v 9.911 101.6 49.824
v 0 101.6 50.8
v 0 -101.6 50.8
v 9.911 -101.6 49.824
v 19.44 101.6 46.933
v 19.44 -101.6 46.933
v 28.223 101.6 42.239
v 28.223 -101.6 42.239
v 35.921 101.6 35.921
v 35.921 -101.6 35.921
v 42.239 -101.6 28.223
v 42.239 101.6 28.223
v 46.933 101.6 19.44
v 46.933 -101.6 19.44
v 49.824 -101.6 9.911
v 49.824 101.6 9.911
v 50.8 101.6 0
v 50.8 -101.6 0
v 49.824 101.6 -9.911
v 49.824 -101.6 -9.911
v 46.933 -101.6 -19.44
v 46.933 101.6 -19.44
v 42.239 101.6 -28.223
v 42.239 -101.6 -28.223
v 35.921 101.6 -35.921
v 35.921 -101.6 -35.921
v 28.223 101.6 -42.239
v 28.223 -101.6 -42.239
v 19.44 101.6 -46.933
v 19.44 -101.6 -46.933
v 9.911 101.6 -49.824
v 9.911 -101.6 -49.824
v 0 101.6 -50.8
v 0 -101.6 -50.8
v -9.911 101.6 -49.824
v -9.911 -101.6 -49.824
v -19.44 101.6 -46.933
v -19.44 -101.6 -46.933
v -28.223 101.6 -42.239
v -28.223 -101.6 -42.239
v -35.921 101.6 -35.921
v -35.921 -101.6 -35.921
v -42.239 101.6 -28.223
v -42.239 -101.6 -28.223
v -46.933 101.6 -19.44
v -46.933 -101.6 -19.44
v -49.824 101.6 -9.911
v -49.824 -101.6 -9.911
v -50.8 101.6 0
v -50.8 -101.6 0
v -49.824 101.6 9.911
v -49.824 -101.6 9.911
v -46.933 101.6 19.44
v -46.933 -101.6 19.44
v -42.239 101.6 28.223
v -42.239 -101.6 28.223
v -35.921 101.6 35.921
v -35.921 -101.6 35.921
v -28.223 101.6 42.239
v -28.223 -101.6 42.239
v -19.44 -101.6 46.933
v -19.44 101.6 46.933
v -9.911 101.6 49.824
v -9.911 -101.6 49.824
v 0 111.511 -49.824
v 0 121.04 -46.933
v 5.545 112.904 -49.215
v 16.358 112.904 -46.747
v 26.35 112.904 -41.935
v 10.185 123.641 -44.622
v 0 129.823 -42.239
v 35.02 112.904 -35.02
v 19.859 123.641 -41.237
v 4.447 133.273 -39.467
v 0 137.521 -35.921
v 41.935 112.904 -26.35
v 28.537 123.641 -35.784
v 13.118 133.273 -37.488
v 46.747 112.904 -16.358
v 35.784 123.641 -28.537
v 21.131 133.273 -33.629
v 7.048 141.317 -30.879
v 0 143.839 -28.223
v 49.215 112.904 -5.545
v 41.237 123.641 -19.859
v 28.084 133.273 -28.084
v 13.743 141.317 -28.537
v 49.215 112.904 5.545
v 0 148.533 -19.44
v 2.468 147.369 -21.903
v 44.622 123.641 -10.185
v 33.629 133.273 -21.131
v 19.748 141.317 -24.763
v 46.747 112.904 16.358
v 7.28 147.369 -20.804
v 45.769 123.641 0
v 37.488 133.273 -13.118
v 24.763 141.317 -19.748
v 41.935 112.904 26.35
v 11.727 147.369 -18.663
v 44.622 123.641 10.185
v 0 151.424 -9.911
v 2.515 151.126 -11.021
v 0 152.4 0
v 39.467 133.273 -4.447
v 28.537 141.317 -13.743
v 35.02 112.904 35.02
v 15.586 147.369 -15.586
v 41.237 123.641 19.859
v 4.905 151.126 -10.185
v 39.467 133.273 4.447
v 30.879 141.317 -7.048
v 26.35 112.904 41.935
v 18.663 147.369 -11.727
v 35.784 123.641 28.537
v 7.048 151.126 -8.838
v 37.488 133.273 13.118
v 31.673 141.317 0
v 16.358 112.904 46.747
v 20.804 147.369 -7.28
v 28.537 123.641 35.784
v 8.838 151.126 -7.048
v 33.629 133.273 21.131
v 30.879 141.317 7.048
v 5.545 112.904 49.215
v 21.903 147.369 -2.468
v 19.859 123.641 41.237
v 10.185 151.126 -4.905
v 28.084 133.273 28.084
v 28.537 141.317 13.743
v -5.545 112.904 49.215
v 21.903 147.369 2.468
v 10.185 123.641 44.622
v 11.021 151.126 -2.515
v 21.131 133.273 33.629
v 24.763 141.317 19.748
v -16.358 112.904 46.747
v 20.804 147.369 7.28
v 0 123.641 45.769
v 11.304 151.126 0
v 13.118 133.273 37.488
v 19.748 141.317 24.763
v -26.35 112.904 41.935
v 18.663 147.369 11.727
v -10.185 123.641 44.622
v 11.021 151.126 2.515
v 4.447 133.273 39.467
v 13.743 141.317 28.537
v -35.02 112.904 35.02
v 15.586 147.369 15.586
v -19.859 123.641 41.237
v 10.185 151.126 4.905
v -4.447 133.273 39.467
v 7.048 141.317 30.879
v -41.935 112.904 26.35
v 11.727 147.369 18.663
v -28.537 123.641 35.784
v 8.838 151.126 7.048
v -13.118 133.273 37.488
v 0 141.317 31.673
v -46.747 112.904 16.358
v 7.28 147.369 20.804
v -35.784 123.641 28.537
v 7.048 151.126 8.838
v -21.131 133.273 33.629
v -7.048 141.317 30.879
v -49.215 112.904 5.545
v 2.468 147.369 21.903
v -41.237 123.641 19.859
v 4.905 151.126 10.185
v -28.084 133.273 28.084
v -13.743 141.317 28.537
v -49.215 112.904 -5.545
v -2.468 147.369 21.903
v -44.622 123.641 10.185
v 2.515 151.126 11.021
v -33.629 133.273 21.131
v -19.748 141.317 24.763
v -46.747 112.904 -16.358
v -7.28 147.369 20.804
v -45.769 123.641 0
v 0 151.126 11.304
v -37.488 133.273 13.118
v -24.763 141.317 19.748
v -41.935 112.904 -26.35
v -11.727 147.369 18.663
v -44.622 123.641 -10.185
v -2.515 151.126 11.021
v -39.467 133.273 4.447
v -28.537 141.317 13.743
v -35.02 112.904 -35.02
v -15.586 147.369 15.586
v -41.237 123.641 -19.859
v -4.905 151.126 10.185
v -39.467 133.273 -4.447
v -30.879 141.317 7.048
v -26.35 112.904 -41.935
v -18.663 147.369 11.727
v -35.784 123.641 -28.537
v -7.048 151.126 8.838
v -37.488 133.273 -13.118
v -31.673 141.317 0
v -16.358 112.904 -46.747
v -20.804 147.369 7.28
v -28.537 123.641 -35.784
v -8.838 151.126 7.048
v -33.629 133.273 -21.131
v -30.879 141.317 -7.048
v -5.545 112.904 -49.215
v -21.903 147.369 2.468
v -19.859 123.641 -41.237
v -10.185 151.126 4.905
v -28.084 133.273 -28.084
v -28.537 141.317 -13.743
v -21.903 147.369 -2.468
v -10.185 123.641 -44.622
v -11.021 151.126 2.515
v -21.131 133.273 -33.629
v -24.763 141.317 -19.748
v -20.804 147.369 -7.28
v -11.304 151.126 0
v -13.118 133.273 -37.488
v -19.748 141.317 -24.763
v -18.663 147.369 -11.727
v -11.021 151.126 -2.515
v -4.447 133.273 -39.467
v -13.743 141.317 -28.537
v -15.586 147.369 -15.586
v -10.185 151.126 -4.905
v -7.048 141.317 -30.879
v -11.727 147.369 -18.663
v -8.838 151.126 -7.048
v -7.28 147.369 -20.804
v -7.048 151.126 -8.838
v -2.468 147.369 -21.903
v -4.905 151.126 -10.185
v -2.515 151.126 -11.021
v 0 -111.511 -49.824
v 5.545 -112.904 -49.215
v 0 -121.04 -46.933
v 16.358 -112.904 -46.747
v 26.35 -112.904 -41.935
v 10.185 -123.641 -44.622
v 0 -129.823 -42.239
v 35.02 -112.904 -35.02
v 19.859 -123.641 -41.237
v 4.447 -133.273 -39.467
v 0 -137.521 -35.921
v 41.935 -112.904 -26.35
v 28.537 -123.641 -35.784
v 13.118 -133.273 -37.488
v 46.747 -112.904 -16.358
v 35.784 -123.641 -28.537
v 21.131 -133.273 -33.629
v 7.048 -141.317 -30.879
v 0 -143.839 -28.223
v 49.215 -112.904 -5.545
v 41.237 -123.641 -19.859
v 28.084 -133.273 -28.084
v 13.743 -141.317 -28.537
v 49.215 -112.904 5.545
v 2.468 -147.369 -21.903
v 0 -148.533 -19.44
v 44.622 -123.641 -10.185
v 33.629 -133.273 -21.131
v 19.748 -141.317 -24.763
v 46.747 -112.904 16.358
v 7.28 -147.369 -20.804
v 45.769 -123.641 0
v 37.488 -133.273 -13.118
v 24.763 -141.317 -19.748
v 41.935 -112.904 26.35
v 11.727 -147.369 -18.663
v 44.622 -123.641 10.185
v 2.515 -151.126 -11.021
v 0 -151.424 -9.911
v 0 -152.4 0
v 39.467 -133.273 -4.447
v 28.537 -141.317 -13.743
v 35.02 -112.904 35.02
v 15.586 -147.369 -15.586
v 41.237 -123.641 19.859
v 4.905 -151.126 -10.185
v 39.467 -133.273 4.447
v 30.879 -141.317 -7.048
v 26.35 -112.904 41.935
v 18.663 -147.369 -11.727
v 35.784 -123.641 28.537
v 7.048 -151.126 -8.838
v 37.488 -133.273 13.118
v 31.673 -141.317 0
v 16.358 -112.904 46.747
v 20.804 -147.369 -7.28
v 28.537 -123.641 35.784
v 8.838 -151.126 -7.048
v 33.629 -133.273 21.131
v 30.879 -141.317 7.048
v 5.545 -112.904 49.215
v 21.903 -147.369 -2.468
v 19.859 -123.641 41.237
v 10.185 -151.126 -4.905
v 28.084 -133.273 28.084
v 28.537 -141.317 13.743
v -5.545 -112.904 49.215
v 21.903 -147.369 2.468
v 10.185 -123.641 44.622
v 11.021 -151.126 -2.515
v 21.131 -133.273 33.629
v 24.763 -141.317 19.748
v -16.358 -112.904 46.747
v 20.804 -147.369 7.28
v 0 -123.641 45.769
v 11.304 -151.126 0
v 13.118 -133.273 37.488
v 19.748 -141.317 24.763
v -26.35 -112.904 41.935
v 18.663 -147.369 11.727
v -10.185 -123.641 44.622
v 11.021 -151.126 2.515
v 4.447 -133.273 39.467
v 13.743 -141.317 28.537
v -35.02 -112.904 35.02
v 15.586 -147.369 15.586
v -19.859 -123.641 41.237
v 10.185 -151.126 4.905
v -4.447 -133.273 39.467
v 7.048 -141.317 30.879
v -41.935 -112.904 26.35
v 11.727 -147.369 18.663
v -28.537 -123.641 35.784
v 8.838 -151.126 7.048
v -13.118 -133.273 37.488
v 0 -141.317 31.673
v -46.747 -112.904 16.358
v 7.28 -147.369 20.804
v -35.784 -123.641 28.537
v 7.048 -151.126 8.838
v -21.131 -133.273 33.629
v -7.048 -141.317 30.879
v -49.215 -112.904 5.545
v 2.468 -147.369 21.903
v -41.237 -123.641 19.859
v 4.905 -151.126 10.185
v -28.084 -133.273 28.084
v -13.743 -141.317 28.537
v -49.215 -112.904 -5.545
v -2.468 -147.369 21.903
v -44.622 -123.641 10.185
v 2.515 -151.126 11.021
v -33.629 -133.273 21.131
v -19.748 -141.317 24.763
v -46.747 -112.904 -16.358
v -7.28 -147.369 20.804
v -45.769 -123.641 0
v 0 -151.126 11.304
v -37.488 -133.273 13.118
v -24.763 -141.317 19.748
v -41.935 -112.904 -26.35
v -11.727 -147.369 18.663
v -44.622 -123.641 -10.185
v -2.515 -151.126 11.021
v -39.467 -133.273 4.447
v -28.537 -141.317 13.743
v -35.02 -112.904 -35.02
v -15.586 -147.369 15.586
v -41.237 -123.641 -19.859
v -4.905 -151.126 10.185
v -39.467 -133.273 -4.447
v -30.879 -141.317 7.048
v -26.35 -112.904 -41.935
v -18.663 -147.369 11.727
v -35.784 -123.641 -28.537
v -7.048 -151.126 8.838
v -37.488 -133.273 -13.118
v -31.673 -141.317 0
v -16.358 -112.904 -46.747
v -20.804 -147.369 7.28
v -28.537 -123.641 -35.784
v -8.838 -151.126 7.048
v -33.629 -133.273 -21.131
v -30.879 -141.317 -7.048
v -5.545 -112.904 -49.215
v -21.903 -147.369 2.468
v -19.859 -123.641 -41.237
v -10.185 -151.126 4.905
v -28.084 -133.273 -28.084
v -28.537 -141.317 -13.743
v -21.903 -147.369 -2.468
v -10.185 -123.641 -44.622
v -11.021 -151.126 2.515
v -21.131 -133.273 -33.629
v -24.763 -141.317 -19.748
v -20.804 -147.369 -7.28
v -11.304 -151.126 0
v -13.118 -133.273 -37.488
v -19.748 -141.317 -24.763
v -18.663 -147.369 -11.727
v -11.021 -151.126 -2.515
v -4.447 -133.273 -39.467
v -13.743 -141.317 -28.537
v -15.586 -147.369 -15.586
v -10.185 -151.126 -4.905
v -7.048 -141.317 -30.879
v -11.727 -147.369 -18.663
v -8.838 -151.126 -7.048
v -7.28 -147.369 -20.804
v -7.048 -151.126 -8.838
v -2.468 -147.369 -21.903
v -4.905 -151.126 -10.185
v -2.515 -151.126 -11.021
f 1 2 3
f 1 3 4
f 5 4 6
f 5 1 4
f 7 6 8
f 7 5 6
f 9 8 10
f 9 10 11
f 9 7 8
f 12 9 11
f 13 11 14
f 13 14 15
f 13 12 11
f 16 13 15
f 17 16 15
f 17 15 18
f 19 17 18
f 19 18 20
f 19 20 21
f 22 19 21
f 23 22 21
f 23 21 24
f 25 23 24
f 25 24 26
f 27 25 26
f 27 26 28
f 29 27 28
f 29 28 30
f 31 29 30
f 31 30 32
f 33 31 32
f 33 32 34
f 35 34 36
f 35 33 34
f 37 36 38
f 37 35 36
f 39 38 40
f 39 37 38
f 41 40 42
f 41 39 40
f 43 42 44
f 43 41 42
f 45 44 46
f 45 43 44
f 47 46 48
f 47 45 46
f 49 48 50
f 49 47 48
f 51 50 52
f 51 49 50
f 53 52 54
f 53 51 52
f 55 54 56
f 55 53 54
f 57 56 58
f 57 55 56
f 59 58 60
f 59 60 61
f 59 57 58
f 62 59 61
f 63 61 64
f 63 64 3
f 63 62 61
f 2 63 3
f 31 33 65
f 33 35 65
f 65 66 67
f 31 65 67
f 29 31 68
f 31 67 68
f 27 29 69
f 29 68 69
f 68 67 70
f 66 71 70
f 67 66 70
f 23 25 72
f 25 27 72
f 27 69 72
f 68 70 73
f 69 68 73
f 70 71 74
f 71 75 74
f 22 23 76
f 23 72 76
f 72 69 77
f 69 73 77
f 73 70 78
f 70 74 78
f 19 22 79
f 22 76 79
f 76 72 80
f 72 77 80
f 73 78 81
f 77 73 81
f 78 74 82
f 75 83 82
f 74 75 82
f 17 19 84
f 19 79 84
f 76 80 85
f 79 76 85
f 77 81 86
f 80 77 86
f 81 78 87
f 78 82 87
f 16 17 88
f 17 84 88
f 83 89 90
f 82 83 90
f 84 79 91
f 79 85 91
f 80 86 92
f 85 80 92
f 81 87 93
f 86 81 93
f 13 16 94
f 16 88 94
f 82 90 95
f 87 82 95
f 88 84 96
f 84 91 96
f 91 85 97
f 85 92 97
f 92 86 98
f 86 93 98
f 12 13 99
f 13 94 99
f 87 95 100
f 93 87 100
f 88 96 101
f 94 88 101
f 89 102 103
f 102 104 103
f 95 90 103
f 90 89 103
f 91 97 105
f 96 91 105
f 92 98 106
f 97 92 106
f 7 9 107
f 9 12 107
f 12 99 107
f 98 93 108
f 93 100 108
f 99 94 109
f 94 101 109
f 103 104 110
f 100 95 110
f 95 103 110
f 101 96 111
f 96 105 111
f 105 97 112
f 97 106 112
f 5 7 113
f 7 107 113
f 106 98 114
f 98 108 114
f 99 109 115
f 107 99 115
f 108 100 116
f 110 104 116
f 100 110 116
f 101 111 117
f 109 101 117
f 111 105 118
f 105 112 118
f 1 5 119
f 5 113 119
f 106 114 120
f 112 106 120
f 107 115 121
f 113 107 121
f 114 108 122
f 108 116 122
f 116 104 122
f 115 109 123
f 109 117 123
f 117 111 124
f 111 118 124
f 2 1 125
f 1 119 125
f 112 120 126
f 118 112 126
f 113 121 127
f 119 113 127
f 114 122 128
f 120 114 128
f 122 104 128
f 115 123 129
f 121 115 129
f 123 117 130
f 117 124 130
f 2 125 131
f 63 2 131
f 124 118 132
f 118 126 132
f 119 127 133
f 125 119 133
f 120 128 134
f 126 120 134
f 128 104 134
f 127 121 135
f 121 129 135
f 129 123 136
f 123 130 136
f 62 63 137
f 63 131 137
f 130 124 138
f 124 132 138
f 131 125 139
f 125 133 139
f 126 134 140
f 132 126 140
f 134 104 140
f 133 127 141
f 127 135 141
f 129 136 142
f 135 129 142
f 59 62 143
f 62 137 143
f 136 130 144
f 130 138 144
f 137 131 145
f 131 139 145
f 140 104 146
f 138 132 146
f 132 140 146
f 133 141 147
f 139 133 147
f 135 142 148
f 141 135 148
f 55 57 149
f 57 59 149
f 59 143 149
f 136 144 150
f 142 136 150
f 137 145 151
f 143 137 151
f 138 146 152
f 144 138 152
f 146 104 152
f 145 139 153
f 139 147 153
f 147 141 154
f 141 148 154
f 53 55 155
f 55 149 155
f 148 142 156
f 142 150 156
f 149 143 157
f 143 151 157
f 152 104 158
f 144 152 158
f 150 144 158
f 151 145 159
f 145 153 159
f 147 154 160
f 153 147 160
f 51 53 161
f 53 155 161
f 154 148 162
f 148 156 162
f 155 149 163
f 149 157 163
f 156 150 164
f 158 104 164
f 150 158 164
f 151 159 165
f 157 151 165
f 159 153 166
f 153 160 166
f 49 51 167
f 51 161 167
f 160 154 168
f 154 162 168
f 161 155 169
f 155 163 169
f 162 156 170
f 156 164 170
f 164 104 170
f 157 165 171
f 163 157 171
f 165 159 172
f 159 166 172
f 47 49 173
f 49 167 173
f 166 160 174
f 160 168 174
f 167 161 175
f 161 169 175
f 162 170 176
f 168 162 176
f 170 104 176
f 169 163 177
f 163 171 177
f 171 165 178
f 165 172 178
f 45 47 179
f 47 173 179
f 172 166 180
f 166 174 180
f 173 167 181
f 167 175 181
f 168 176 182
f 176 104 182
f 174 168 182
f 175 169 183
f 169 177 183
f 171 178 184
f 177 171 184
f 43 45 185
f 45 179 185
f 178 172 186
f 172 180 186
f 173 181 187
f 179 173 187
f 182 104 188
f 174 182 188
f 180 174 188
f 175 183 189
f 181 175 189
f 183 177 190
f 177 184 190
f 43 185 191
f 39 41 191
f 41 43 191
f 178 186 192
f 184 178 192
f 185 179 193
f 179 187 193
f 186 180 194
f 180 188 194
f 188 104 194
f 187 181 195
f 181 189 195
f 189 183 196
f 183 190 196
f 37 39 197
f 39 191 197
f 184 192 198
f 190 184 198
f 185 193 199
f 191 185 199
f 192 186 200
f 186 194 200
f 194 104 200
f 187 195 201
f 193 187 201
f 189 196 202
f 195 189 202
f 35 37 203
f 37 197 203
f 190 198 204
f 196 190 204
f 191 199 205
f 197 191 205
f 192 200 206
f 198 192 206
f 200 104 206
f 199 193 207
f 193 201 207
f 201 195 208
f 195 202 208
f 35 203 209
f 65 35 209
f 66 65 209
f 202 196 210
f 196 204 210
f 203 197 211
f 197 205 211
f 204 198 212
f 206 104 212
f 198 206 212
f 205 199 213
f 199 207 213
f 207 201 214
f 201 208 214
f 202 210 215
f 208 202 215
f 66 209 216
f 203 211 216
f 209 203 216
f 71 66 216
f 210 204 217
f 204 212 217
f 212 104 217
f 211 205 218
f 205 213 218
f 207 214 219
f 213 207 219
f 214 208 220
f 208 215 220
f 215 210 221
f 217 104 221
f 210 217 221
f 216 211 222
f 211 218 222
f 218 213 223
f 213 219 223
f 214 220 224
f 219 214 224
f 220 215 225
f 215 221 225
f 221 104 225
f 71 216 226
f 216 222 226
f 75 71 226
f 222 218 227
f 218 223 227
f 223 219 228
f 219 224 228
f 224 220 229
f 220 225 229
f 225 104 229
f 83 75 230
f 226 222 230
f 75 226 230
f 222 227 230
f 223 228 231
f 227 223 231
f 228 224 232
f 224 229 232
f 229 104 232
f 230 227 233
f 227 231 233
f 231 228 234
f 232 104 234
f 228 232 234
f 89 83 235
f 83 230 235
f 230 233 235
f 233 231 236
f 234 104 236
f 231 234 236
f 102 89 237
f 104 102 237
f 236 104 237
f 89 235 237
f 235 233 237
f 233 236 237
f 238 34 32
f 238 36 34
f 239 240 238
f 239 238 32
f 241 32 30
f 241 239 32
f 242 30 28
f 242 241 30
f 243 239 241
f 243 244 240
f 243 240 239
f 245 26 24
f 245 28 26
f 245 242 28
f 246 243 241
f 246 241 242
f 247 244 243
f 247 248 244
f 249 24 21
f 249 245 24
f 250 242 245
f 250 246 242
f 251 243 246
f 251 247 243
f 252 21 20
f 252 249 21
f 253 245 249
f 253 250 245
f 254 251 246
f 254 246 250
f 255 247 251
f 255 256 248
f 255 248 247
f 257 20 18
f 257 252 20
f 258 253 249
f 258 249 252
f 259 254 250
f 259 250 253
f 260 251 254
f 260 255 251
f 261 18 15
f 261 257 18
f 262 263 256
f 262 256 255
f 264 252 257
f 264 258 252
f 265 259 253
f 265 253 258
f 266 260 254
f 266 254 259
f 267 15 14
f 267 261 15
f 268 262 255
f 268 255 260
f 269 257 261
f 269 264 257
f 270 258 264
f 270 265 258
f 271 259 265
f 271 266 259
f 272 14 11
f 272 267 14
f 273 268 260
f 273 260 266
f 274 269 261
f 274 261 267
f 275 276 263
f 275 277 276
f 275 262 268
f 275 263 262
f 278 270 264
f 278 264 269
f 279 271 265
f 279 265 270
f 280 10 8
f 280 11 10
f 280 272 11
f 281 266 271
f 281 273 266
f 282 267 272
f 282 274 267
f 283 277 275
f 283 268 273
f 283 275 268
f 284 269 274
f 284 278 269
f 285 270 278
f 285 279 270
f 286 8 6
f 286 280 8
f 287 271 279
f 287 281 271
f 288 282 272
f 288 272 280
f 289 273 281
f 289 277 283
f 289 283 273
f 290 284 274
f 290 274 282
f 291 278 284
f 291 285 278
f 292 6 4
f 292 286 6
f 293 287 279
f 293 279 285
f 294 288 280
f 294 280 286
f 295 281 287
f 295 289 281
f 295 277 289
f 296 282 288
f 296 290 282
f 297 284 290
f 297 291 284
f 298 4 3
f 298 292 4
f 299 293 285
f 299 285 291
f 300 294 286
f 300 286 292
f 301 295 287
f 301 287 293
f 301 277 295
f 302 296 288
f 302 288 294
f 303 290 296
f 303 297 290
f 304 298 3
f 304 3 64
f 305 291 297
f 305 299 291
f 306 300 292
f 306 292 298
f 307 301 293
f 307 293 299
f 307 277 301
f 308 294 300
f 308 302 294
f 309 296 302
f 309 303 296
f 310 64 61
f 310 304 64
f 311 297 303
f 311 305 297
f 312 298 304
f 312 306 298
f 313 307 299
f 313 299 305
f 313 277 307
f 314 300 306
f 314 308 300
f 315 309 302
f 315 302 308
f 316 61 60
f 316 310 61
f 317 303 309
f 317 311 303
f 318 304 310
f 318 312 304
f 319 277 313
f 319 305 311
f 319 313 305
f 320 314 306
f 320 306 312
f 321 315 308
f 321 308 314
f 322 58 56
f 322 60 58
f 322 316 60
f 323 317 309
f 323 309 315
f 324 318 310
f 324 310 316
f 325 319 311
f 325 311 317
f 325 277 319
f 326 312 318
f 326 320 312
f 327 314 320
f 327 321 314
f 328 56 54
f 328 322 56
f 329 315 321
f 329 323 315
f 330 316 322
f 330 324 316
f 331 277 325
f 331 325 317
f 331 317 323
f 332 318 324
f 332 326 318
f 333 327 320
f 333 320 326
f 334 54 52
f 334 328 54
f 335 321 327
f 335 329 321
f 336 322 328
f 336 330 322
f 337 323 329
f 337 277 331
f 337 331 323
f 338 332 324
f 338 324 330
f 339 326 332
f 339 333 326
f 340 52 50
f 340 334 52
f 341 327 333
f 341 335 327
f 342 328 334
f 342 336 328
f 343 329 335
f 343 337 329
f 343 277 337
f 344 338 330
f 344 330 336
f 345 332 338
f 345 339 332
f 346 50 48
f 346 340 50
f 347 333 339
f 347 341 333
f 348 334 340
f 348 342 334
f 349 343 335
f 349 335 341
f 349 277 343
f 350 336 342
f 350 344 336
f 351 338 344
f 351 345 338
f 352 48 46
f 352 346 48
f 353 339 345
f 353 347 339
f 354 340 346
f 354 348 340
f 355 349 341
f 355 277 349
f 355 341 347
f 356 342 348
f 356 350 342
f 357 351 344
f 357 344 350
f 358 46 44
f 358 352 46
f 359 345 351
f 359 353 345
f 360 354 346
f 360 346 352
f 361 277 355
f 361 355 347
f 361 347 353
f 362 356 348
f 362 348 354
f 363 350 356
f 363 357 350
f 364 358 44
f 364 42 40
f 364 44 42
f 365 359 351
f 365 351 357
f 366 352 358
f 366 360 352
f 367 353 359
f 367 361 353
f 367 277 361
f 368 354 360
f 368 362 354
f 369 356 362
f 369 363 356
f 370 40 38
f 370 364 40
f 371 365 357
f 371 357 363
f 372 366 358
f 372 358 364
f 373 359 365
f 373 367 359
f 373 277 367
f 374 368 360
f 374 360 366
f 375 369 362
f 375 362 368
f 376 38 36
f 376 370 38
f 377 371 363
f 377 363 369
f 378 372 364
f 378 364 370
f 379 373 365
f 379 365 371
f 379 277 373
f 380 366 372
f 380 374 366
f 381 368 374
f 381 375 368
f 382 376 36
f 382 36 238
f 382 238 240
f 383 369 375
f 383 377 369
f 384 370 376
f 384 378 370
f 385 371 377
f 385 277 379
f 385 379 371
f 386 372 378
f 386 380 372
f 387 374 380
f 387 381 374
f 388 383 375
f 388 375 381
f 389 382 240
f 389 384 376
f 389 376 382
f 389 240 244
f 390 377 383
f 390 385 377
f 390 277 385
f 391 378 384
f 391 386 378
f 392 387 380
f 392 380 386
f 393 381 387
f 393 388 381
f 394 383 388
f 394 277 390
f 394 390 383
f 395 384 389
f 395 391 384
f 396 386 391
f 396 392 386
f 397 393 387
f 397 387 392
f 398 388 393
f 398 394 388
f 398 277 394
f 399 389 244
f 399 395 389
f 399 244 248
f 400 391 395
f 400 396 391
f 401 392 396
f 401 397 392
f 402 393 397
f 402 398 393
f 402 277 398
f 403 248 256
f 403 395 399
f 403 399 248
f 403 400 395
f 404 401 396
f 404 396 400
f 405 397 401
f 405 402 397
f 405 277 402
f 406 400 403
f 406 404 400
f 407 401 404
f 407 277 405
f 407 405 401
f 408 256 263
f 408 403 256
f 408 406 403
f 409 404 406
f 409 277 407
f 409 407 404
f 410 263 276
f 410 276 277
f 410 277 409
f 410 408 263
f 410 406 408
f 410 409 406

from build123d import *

# Parameters (mm, degrees)
SKETCH1_R           = 50.8
BOSS_EXTRUDE1_DEPTH = 101.6


with BuildPart() as part:
    # Sketch1 → Boss-Extrude1 (new, symmetric)
    with BuildSketch(Plane(origin=(0, 0, 0), x_dir=(1, 0, 0), z_dir=(0, 1, 0))):
        with Locations(Location((0, 0, 0), (0, 0, 270))):
            Circle(SKETCH1_R)
    extrude(amount=BOSS_EXTRUDE1_DEPTH, both=True)

    # Sketch3 → Revolve1 (revolve)
    with BuildSketch(Plane(origin=(0, 0, 0), x_dir=(0, 0, -1), z_dir=(1, 0, 0)), mode=Mode.PRIVATE) as revolve1_sk:
        with BuildLine():
            Line((0, 101.6), (-50.8, 101.6))
            ThreePointArc((-50.8, 101.6), (-35.921024484, 137.521024484), (0, 152.4))
            Line((0, 152.4), (0, 101.6))
        make_face()
    revolve1 = revolve(revolve1_sk.sketch.rotate(Axis((0, 152.4, 0), (0, -1, 0)), 180), axis=Axis((0, 152.4, 0), (0, -1, 0)))

    # Mirror1: Revolve1 across plane
    add(revolve1.mirror(Plane.ZX))


solid = part.part
